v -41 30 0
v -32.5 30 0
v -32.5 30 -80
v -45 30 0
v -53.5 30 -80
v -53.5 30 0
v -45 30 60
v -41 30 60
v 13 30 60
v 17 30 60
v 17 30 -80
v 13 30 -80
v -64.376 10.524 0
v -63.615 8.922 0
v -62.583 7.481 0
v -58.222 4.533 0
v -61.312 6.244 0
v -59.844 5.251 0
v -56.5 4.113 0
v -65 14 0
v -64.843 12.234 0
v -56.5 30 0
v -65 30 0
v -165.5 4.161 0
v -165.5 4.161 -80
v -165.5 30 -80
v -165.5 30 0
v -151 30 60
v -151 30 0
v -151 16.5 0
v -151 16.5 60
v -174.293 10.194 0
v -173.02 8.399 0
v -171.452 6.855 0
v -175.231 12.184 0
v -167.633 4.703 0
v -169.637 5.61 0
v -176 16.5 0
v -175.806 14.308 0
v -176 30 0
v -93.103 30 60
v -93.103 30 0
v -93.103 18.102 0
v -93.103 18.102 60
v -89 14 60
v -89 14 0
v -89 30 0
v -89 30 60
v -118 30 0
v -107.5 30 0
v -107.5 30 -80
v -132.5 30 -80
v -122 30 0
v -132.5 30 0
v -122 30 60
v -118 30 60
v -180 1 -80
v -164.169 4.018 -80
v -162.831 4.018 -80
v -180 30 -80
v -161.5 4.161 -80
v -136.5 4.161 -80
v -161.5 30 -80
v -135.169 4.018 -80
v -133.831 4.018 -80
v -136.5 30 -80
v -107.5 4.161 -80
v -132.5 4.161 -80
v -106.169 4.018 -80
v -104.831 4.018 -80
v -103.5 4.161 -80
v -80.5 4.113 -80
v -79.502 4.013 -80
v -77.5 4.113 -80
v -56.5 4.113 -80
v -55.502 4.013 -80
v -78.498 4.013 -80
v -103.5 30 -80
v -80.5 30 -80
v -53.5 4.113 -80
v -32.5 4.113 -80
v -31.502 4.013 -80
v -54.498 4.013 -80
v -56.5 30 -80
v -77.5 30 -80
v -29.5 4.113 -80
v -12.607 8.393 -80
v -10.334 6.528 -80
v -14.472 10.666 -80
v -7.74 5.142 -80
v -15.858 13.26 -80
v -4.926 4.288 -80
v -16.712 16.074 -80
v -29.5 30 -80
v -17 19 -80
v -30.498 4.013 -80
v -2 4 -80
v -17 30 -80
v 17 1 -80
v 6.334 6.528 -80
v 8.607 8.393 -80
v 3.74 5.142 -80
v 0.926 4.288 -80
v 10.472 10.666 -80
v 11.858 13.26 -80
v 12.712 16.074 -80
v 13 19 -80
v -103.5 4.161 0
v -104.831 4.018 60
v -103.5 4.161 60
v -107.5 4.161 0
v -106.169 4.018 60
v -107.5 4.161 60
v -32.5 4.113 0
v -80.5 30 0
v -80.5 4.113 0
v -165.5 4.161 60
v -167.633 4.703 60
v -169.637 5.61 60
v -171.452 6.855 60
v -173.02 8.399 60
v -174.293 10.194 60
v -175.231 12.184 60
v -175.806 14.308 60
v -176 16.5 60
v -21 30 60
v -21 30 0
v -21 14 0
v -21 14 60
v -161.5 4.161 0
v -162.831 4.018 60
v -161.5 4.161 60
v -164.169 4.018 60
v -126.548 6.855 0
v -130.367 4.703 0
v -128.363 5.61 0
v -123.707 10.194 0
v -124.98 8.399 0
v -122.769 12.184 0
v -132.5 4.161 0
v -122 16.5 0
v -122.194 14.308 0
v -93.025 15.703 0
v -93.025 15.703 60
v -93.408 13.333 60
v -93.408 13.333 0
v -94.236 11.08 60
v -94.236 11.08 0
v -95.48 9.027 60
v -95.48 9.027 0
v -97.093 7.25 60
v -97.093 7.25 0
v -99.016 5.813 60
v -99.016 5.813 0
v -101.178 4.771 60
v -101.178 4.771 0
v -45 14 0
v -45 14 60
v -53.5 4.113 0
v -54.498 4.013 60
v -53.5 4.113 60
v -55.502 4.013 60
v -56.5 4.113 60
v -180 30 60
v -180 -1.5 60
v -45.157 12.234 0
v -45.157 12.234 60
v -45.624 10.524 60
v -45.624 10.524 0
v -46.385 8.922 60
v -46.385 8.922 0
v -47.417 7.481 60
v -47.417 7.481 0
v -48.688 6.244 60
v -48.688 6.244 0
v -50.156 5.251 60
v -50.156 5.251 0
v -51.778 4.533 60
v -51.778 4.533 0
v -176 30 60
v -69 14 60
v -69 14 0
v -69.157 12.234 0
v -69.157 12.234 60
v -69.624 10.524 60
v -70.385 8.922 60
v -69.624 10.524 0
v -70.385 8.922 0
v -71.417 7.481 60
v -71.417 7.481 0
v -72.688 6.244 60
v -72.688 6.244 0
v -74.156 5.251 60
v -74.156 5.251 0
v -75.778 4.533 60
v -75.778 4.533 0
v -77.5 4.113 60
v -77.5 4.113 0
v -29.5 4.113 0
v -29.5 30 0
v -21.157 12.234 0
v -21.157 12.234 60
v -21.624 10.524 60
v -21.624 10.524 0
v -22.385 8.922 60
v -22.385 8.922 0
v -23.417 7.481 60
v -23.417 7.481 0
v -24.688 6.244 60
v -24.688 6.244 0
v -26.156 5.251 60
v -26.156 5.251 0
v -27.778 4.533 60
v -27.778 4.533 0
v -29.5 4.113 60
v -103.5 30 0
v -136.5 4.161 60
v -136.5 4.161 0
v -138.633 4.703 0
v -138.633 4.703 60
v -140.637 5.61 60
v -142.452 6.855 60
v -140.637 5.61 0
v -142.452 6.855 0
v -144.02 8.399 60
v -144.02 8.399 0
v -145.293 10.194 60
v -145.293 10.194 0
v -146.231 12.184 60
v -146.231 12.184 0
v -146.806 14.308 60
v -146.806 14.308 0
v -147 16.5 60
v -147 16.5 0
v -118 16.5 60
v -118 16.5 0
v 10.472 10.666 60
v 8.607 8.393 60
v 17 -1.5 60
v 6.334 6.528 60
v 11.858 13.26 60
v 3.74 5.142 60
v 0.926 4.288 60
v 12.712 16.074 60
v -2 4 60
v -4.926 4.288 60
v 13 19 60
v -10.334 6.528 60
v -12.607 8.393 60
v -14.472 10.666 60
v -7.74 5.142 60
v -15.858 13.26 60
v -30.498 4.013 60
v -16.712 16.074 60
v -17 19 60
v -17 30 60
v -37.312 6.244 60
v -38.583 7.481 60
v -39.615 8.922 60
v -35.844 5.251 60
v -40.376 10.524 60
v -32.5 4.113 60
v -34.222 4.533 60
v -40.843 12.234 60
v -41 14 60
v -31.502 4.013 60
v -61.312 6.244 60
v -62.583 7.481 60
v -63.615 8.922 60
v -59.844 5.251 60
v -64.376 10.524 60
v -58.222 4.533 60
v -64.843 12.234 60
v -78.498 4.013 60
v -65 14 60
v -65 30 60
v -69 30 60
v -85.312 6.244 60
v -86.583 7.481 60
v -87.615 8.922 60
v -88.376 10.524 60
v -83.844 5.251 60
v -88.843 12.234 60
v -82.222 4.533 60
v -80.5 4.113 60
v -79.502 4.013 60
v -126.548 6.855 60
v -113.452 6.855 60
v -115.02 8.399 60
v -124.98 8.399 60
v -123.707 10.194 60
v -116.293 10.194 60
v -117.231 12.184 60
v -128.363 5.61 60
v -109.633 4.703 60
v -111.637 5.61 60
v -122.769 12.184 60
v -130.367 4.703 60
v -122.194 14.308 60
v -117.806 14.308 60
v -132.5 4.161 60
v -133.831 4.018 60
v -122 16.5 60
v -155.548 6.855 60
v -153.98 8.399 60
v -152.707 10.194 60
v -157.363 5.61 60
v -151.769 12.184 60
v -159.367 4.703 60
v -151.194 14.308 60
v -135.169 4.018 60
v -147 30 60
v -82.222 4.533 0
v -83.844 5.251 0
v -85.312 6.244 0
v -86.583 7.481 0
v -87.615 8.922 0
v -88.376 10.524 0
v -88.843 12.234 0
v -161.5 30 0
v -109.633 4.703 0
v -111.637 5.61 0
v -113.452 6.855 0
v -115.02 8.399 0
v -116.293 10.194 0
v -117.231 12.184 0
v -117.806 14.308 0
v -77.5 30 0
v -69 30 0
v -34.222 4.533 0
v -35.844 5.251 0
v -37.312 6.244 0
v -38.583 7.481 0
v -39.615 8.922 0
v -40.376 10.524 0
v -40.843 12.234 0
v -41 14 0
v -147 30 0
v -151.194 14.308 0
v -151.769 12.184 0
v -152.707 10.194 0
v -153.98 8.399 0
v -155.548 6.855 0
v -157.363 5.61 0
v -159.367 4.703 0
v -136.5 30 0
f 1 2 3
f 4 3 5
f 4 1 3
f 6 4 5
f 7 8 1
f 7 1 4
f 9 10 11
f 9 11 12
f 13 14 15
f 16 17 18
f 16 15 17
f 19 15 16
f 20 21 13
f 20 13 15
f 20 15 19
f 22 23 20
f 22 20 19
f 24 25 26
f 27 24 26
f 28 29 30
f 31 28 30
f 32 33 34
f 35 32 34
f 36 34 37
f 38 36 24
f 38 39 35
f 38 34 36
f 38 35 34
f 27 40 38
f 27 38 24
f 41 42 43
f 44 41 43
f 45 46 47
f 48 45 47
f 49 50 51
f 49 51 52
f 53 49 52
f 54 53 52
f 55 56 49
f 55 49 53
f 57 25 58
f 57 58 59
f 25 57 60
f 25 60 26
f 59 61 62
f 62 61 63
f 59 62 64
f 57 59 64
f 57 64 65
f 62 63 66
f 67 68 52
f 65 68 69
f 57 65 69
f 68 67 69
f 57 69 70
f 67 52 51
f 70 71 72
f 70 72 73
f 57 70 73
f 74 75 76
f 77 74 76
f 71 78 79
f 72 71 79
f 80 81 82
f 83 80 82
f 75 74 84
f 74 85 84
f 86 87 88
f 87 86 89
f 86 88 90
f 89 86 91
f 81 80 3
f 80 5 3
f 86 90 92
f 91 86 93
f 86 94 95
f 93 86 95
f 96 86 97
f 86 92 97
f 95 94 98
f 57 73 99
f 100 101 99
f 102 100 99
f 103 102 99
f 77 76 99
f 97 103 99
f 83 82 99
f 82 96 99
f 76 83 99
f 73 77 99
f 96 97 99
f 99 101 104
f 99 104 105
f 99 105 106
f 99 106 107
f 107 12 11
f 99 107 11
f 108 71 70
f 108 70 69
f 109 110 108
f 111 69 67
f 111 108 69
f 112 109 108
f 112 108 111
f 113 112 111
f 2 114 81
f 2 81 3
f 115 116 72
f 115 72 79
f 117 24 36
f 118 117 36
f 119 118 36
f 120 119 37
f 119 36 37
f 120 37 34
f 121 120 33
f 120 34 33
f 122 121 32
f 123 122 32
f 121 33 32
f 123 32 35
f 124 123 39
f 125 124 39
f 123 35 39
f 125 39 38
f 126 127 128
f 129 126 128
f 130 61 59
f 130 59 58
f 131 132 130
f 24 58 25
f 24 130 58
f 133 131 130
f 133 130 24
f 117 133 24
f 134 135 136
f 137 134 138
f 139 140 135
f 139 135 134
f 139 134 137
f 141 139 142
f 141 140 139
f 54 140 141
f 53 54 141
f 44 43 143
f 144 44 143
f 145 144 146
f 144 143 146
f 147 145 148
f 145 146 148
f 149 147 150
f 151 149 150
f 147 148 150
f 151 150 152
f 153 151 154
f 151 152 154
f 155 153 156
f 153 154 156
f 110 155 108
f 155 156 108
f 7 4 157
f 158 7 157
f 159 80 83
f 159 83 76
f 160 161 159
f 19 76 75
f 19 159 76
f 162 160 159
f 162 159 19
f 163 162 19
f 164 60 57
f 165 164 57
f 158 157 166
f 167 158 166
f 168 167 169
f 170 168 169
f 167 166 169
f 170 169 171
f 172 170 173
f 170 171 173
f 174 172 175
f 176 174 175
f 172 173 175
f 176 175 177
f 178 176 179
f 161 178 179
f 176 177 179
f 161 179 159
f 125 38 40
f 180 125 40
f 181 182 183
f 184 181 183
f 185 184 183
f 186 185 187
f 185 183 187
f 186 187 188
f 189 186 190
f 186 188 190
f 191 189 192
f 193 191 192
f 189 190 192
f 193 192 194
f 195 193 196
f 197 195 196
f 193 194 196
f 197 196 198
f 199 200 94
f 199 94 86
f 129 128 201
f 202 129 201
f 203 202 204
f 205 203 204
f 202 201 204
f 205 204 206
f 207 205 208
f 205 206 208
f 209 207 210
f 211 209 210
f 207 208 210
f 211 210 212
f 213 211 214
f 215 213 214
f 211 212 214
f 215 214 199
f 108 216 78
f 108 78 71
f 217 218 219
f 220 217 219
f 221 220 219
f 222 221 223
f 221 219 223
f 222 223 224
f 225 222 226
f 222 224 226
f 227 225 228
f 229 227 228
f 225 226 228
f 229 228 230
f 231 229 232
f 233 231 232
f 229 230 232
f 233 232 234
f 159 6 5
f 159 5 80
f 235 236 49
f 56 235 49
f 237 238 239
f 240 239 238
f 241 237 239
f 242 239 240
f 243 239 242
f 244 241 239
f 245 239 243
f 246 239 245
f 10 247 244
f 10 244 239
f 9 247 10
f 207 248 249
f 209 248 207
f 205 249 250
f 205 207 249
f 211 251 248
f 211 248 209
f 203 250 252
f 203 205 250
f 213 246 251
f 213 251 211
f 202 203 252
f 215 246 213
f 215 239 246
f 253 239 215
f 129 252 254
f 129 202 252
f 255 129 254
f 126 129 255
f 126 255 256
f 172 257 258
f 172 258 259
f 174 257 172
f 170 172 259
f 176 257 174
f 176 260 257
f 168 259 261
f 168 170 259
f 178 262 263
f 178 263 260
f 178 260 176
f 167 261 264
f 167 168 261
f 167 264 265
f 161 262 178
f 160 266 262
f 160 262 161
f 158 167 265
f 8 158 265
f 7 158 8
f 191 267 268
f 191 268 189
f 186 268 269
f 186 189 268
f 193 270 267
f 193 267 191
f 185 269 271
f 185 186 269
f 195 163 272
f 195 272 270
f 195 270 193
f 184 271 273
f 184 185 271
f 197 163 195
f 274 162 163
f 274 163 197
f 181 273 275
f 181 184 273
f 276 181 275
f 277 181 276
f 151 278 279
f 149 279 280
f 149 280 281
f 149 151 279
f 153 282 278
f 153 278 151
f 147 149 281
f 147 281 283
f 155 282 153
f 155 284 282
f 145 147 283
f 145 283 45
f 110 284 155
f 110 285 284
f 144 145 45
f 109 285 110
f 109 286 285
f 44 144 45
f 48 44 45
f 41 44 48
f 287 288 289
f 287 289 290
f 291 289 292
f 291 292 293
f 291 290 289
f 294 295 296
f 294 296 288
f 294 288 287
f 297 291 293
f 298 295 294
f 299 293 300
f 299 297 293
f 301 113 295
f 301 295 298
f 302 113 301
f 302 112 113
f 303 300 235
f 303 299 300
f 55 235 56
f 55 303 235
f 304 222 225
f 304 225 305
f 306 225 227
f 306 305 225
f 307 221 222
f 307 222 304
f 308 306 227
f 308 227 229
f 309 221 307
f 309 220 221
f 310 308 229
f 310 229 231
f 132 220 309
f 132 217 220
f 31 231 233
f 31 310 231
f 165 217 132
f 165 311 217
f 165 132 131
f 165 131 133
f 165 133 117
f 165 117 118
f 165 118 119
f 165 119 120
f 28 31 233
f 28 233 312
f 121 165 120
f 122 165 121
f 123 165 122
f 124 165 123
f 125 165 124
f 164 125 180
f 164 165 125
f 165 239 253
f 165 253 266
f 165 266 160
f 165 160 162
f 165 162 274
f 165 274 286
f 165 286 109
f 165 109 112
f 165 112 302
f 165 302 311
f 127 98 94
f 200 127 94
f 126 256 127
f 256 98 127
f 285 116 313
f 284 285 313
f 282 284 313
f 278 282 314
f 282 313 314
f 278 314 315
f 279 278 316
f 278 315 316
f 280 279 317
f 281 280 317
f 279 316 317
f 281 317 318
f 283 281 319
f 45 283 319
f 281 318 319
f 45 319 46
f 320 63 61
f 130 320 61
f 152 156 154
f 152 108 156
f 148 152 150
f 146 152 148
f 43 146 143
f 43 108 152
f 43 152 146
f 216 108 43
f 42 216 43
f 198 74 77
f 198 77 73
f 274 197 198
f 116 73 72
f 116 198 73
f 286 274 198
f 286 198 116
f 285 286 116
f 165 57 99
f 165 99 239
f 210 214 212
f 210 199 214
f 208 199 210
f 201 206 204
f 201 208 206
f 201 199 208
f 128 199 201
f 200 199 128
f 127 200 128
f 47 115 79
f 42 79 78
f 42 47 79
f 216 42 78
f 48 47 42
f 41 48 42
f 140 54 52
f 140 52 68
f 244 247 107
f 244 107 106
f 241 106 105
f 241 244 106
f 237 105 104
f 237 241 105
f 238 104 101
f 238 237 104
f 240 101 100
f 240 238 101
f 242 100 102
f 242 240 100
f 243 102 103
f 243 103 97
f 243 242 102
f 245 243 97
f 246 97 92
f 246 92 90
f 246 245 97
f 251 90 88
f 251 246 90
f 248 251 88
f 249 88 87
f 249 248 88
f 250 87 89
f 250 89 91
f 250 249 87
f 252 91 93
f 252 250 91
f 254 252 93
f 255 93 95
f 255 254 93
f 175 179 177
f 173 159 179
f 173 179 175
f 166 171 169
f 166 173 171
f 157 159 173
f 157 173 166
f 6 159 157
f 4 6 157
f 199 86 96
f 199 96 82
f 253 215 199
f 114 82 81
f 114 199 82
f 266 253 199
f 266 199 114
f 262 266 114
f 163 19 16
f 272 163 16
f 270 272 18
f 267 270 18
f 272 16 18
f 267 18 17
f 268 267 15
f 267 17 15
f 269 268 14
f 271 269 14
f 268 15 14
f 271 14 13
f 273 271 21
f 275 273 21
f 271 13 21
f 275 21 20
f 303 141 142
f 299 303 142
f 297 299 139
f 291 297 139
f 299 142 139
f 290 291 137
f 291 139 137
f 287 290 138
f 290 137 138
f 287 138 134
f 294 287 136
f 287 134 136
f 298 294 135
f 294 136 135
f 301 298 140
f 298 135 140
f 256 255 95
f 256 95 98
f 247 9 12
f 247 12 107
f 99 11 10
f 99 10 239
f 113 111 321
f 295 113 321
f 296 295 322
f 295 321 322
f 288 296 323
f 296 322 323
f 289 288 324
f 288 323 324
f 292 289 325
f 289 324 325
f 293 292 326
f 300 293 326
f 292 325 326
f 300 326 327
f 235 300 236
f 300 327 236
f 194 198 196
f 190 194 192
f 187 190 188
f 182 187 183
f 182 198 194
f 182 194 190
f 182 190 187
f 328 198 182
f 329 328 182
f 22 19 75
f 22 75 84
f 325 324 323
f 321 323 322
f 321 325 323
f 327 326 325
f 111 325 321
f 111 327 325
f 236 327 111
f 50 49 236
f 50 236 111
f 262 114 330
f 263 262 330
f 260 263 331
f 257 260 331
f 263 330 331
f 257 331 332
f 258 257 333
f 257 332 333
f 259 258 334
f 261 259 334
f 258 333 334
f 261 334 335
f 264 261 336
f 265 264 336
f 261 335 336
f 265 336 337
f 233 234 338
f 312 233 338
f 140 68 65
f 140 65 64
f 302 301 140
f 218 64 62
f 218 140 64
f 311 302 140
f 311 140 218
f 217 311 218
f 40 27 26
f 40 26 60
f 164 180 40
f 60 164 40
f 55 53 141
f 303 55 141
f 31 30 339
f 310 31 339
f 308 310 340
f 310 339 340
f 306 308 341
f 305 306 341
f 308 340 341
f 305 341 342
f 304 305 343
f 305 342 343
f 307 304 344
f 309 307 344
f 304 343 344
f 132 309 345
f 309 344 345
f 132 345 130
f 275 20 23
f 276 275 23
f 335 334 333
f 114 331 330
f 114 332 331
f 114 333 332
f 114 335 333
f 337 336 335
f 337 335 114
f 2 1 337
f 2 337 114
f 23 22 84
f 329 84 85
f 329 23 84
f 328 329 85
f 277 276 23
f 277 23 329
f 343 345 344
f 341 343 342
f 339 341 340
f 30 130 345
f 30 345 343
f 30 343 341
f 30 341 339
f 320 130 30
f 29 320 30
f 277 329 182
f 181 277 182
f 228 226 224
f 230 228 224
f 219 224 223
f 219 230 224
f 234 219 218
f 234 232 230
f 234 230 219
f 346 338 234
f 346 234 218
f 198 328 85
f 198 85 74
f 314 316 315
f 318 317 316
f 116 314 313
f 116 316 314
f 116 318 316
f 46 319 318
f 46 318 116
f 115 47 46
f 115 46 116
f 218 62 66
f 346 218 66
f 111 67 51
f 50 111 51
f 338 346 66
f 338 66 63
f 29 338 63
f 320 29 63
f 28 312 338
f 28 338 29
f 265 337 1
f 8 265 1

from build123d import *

# Parameters (mm, degrees)
F1_DEPTH = 60
F2_DEPTH = 80
F4_DEPTH = 197
F5_DEPTH = 197


with BuildPart() as f1:
    # F0 (on Top) → F1 (new body)
    with BuildSketch(Plane.XY):
        with BuildLine():
            Line((-176, 30), (-180, 30))
            Line((-180, 30), (-180, 0))
            Line((-180, 0), (0, 0))
            Line((0, 0), (17, 0))
            Line((17, 0), (17, 30))
            Line((17, 30), (13, 30))
            Line((13, 30), (13, 19))
            ThreePointArc((13, 19), (-2, 4), (-17, 19))
            Line((-17, 19), (-17, 30))
            Line((-17, 30), (-21, 30))
            Line((-21, 30), (-21, 14))
            ThreePointArc((-21, 14), (-23.417125, 7.480798), (-29.5, 4.11314))
            ThreePointArc((-29.5, 4.11314), (-31, 4), (-32.5, 4.11314))
            ThreePointArc((-32.5, 4.11314), (-38.582875, 7.480798), (-41, 14))
            Line((-41, 14), (-41, 30))
            Line((-41, 30), (-45, 30))
            Line((-45, 30), (-45, 14))
            ThreePointArc((-45, 14), (-47.417125, 7.480798), (-53.5, 4.11314))
            ThreePointArc((-53.5, 4.11314), (-55, 4), (-56.5, 4.11314))
            ThreePointArc((-56.5, 4.11314), (-62.582875, 7.480798), (-65, 14))
            Line((-65, 14), (-65, 30))
            Line((-65, 30), (-69, 30))
            Line((-69, 30), (-69, 14))
            ThreePointArc((-69, 14), (-71.417125, 7.480798), (-77.5, 4.11314))
            ThreePointArc((-77.5, 4.11314), (-79, 4), (-80.5, 4.11314))
            ThreePointArc((-80.5, 4.11314), (-86.582875, 7.480798), (-89, 14))
            Line((-89, 14), (-89, 30))
            Line((-89, 30), (-93.103136, 30))
            Line((-93.103136, 30), (-93.103136, 18.102423))
            ThreePointArc((-93.103136, 18.102423), (-95.479622, 9.027248), (-103.5, 4.161037))
            ThreePointArc((-103.5, 4.161037), (-105.5, 4), (-107.5, 4.161037))
            ThreePointArc((-107.5, 4.161037), (-115.019716, 8.399074), (-118, 16.5))
            Line((-118, 16.5), (-118, 30))
            Line((-118, 30), (-122, 30))
            Line((-122, 30), (-122, 16.5))
            ThreePointArc((-122, 16.5), (-124.980284, 8.399074), (-132.5, 4.161037))
            ThreePointArc((-132.5, 4.161037), (-134.5, 4), (-136.5, 4.161037))
            ThreePointArc((-136.5, 4.161037), (-144.019716, 8.399074), (-147, 16.5))
            Line((-147, 16.5), (-147, 30))
            Line((-147, 30), (-151, 30))
            Line((-151, 30), (-151, 16.5))
            ThreePointArc((-151, 16.5), (-153.980284, 8.399074), (-161.5, 4.161037))
            ThreePointArc((-161.5, 4.161037), (-163.5, 4), (-165.5, 4.161037))
            ThreePointArc((-165.5, 4.161037), (-173.019716, 8.399074), (-176, 16.5))
            Line((-176, 16.5), (-176, 30))
        make_face()
    extrude(amount=F1_DEPTH)

    # F0 (on Top) → F2 (join)
    with BuildSketch(Plane.XY):
        with BuildLine():
            Line((-176, 30), (-180, 30))
            Line((-180, 30), (-180, 0))
            Line((-180, 0), (0, 0))
            Line((0, 0), (17, 0))
            Line((17, 0), (17, 30))
            Line((17, 30), (13, 30))
            Line((13, 30), (13, 19))
            ThreePointArc((13, 19), (-2, 4), (-17, 19))
            Line((-17, 19), (-17, 30))
            Line((-17, 30), (-21, 30))
            Line((-21, 30), (-21, 14))
            ThreePointArc((-21, 14), (-23.417125, 7.480798), (-29.5, 4.11314))
            ThreePointArc((-29.5, 4.11314), (-31, 4), (-32.5, 4.11314))
            ThreePointArc((-32.5, 4.11314), (-38.582875, 7.480798), (-41, 14))
            Line((-41, 14), (-41, 30))
            Line((-41, 30), (-45, 30))
            Line((-45, 30), (-45, 14))
            ThreePointArc((-45, 14), (-47.417125, 7.480798), (-53.5, 4.11314))
            ThreePointArc((-53.5, 4.11314), (-55, 4), (-56.5, 4.11314))
            ThreePointArc((-56.5, 4.11314), (-62.582875, 7.480798), (-65, 14))
            Line((-65, 14), (-65, 30))
            Line((-65, 30), (-69, 30))
            Line((-69, 30), (-69, 14))
            ThreePointArc((-69, 14), (-71.417125, 7.480798), (-77.5, 4.11314))
            ThreePointArc((-77.5, 4.11314), (-79, 4), (-80.5, 4.11314))
            ThreePointArc((-80.5, 4.11314), (-86.582875, 7.480798), (-89, 14))
            Line((-89, 14), (-89, 30))
            Line((-89, 30), (-93.103136, 30))
            Line((-93.103136, 30), (-93.103136, 18.102423))
            ThreePointArc((-93.103136, 18.102423), (-95.479622, 9.027248), (-103.5, 4.161037))
            ThreePointArc((-103.5, 4.161037), (-105.5, 4), (-107.5, 4.161037))
            ThreePointArc((-107.5, 4.161037), (-115.019716, 8.399074), (-118, 16.5))
            Line((-118, 16.5), (-118, 30))
            Line((-118, 30), (-122, 30))
            Line((-122, 30), (-122, 16.5))
            ThreePointArc((-122, 16.5), (-124.980284, 8.399074), (-132.5, 4.161037))
            ThreePointArc((-132.5, 4.161037), (-134.5, 4), (-136.5, 4.161037))
            ThreePointArc((-136.5, 4.161037), (-144.019716, 8.399074), (-147, 16.5))
            Line((-147, 16.5), (-147, 30))
            Line((-147, 30), (-151, 30))
            Line((-151, 30), (-151, 16.5))
            ThreePointArc((-151, 16.5), (-153.980284, 8.399074), (-161.5, 4.161037))
            ThreePointArc((-161.5, 4.161037), (-163.5, 4), (-165.5, 4.161037))
            ThreePointArc((-165.5, 4.161037), (-173.019716, 8.399074), (-176, 16.5))
            Line((-176, 16.5), (-176, 30))
        make_face()
        with BuildLine():
            Line((-165.5, 30), (-176, 30))
            Line((-176, 30), (-176, 16.5))
            ThreePointArc((-176, 16.5), (-173.019716, 8.399074), (-165.5, 4.161037))
            Line((-165.5, 4.161037), (-165.5, 8.647036))
            Line((-165.5, 8.647036), (-165.5, 30))
        make_face()
        with BuildLine():
            Line((-151, 30), (-161.5, 30))
            Line((-161.5, 30), (-161.5, 11.134194))
            Line((-161.5, 11.134194), (-161.5, 4.161037))
            ThreePointArc((-161.5, 4.161037), (-153.980284, 8.399074), (-151, 16.5))
            Line((-151, 16.5), (-151, 30))
        make_face()
        with BuildLine():
            Line((-136.5, 30), (-147, 30))
            Line((-147, 30), (-147, 16.5))
            ThreePointArc((-147, 16.5), (-144.019716, 8.399074), (-136.5, 4.161037))
            Line((-136.5, 4.161037), (-136.5, 13.265696))
            Line((-136.5, 13.265696), (-136.5, 30))
        make_face()
        with BuildLine():
            Line((-122, 30), (-132.5, 30))
            Line((-132.5, 30), (-132.5, 14.049987))
            Line((-132.5, 14.049987), (-132.5, 4.161037))
            ThreePointArc((-132.5, 4.161037), (-124.980284, 8.399074), (-122, 16.5))
            Line((-122, 16.5), (-122, 30))
        make_face()
        with BuildLine():
            Line((-107.5, 30), (-118, 30))
            Line((-118, 30), (-118, 16.5))
            ThreePointArc((-118, 16.5), (-115.019716, 8.399074), (-107.5, 4.161037))
            Line((-107.5, 4.161037), (-107.5, 11.18967))
            Line((-107.5, 11.18967), (-107.5, 30))
        make_face()
        with BuildLine():
            Line((-93.103136, 30), (-103.5, 30))
            Line((-103.5, 30), (-103.5, 10.63935))
            Line((-103.5, 10.63935), (-103.5, 4.161037))
            ThreePointArc((-103.5, 4.161037), (-95.479622, 9.027248), (-93.103136, 18.102423))
            Line((-93.103136, 18.102423), (-93.103136, 30))
        make_face()
        with BuildLine():
            Line((-80.5, 30), (-89, 30))
            Line((-89, 30), (-89, 14))
            ThreePointArc((-89, 14), (-86.582875, 7.480798), (-80.5, 4.11314))
            Line((-80.5, 4.11314), (-80.5, 18.017488))
            Line((-80.5, 18.017488), (-80.5, 30))
        make_face()
        with BuildLine():
            Line((-69, 30), (-77.5, 30))
            Line((-77.5, 30), (-77.5, 17.524529))
            Line((-77.5, 17.524529), (-77.5, 4.11314))
            ThreePointArc((-77.5, 4.11314), (-71.417125, 7.480798), (-69, 14))
            Line((-69, 14), (-69, 30))
        make_face()
        with BuildLine():
            Line((-56.5, 10.179425), (-56.5, 30))
            Line((-56.5, 30), (-65, 30))
            Line((-65, 30), (-65, 14))
            ThreePointArc((-65, 14), (-62.582875, 7.480798), (-56.5, 4.11314))
            Line((-56.5, 4.11314), (-56.5, 10.179425))
        make_face()
        with BuildLine():
            Line((-45, 14), (-45, 30))
            Line((-45, 30), (-53.5, 30))
            Line((-53.5, 30), (-53.5, 10.014313))
            Line((-53.5, 10.014313), (-53.5, 4.11314))
            ThreePointArc((-53.5, 4.11314), (-47.417125, 7.480798), (-45, 14))
        make_face()
        with BuildLine():
            Line((-32.5, 17.372157), (-32.5, 30))
            Line((-32.5, 30), (-41, 30))
            Line((-41, 30), (-41, 14))
            ThreePointArc((-41, 14), (-38.582875, 7.480798), (-32.5, 4.11314))
            Line((-32.5, 4.11314), (-32.5, 17.372157))
        make_face()
        with BuildLine():
            Line((-21, 14), (-21, 30))
            Line((-21, 30), (-29.5, 30))
            Line((-29.5, 30), (-29.5, 17.21671))
            Line((-29.5, 17.21671), (-29.5, 4.11314))
            ThreePointArc((-29.5, 4.11314), (-23.417125, 7.480798), (-21, 14))
        make_face()
    extrude(amount=-F2_DEPTH)

    # F3 (on face) → F4 (join, through all)
    with BuildSketch(Plane(origin=(-180, 0, 0), x_dir=(0, -1, 0), z_dir=(-1, 0, 0))):
        Polygon((0, -24), (1.5, 60), (0, 60), align=None)
    extrude(amount=-F4_DEPTH)

    # F3 (on face) → F5 (cut, through all)
    with BuildSketch(Plane(origin=(-180, 0, 0), x_dir=(0, -1, 0), z_dir=(-1, 0, 0))):
        Polygon((0, -80), (0, -24), (-1, -80), align=None)
    extrude(amount=-F5_DEPTH, mode=Mode.SUBTRACT)


solid = f1.part
